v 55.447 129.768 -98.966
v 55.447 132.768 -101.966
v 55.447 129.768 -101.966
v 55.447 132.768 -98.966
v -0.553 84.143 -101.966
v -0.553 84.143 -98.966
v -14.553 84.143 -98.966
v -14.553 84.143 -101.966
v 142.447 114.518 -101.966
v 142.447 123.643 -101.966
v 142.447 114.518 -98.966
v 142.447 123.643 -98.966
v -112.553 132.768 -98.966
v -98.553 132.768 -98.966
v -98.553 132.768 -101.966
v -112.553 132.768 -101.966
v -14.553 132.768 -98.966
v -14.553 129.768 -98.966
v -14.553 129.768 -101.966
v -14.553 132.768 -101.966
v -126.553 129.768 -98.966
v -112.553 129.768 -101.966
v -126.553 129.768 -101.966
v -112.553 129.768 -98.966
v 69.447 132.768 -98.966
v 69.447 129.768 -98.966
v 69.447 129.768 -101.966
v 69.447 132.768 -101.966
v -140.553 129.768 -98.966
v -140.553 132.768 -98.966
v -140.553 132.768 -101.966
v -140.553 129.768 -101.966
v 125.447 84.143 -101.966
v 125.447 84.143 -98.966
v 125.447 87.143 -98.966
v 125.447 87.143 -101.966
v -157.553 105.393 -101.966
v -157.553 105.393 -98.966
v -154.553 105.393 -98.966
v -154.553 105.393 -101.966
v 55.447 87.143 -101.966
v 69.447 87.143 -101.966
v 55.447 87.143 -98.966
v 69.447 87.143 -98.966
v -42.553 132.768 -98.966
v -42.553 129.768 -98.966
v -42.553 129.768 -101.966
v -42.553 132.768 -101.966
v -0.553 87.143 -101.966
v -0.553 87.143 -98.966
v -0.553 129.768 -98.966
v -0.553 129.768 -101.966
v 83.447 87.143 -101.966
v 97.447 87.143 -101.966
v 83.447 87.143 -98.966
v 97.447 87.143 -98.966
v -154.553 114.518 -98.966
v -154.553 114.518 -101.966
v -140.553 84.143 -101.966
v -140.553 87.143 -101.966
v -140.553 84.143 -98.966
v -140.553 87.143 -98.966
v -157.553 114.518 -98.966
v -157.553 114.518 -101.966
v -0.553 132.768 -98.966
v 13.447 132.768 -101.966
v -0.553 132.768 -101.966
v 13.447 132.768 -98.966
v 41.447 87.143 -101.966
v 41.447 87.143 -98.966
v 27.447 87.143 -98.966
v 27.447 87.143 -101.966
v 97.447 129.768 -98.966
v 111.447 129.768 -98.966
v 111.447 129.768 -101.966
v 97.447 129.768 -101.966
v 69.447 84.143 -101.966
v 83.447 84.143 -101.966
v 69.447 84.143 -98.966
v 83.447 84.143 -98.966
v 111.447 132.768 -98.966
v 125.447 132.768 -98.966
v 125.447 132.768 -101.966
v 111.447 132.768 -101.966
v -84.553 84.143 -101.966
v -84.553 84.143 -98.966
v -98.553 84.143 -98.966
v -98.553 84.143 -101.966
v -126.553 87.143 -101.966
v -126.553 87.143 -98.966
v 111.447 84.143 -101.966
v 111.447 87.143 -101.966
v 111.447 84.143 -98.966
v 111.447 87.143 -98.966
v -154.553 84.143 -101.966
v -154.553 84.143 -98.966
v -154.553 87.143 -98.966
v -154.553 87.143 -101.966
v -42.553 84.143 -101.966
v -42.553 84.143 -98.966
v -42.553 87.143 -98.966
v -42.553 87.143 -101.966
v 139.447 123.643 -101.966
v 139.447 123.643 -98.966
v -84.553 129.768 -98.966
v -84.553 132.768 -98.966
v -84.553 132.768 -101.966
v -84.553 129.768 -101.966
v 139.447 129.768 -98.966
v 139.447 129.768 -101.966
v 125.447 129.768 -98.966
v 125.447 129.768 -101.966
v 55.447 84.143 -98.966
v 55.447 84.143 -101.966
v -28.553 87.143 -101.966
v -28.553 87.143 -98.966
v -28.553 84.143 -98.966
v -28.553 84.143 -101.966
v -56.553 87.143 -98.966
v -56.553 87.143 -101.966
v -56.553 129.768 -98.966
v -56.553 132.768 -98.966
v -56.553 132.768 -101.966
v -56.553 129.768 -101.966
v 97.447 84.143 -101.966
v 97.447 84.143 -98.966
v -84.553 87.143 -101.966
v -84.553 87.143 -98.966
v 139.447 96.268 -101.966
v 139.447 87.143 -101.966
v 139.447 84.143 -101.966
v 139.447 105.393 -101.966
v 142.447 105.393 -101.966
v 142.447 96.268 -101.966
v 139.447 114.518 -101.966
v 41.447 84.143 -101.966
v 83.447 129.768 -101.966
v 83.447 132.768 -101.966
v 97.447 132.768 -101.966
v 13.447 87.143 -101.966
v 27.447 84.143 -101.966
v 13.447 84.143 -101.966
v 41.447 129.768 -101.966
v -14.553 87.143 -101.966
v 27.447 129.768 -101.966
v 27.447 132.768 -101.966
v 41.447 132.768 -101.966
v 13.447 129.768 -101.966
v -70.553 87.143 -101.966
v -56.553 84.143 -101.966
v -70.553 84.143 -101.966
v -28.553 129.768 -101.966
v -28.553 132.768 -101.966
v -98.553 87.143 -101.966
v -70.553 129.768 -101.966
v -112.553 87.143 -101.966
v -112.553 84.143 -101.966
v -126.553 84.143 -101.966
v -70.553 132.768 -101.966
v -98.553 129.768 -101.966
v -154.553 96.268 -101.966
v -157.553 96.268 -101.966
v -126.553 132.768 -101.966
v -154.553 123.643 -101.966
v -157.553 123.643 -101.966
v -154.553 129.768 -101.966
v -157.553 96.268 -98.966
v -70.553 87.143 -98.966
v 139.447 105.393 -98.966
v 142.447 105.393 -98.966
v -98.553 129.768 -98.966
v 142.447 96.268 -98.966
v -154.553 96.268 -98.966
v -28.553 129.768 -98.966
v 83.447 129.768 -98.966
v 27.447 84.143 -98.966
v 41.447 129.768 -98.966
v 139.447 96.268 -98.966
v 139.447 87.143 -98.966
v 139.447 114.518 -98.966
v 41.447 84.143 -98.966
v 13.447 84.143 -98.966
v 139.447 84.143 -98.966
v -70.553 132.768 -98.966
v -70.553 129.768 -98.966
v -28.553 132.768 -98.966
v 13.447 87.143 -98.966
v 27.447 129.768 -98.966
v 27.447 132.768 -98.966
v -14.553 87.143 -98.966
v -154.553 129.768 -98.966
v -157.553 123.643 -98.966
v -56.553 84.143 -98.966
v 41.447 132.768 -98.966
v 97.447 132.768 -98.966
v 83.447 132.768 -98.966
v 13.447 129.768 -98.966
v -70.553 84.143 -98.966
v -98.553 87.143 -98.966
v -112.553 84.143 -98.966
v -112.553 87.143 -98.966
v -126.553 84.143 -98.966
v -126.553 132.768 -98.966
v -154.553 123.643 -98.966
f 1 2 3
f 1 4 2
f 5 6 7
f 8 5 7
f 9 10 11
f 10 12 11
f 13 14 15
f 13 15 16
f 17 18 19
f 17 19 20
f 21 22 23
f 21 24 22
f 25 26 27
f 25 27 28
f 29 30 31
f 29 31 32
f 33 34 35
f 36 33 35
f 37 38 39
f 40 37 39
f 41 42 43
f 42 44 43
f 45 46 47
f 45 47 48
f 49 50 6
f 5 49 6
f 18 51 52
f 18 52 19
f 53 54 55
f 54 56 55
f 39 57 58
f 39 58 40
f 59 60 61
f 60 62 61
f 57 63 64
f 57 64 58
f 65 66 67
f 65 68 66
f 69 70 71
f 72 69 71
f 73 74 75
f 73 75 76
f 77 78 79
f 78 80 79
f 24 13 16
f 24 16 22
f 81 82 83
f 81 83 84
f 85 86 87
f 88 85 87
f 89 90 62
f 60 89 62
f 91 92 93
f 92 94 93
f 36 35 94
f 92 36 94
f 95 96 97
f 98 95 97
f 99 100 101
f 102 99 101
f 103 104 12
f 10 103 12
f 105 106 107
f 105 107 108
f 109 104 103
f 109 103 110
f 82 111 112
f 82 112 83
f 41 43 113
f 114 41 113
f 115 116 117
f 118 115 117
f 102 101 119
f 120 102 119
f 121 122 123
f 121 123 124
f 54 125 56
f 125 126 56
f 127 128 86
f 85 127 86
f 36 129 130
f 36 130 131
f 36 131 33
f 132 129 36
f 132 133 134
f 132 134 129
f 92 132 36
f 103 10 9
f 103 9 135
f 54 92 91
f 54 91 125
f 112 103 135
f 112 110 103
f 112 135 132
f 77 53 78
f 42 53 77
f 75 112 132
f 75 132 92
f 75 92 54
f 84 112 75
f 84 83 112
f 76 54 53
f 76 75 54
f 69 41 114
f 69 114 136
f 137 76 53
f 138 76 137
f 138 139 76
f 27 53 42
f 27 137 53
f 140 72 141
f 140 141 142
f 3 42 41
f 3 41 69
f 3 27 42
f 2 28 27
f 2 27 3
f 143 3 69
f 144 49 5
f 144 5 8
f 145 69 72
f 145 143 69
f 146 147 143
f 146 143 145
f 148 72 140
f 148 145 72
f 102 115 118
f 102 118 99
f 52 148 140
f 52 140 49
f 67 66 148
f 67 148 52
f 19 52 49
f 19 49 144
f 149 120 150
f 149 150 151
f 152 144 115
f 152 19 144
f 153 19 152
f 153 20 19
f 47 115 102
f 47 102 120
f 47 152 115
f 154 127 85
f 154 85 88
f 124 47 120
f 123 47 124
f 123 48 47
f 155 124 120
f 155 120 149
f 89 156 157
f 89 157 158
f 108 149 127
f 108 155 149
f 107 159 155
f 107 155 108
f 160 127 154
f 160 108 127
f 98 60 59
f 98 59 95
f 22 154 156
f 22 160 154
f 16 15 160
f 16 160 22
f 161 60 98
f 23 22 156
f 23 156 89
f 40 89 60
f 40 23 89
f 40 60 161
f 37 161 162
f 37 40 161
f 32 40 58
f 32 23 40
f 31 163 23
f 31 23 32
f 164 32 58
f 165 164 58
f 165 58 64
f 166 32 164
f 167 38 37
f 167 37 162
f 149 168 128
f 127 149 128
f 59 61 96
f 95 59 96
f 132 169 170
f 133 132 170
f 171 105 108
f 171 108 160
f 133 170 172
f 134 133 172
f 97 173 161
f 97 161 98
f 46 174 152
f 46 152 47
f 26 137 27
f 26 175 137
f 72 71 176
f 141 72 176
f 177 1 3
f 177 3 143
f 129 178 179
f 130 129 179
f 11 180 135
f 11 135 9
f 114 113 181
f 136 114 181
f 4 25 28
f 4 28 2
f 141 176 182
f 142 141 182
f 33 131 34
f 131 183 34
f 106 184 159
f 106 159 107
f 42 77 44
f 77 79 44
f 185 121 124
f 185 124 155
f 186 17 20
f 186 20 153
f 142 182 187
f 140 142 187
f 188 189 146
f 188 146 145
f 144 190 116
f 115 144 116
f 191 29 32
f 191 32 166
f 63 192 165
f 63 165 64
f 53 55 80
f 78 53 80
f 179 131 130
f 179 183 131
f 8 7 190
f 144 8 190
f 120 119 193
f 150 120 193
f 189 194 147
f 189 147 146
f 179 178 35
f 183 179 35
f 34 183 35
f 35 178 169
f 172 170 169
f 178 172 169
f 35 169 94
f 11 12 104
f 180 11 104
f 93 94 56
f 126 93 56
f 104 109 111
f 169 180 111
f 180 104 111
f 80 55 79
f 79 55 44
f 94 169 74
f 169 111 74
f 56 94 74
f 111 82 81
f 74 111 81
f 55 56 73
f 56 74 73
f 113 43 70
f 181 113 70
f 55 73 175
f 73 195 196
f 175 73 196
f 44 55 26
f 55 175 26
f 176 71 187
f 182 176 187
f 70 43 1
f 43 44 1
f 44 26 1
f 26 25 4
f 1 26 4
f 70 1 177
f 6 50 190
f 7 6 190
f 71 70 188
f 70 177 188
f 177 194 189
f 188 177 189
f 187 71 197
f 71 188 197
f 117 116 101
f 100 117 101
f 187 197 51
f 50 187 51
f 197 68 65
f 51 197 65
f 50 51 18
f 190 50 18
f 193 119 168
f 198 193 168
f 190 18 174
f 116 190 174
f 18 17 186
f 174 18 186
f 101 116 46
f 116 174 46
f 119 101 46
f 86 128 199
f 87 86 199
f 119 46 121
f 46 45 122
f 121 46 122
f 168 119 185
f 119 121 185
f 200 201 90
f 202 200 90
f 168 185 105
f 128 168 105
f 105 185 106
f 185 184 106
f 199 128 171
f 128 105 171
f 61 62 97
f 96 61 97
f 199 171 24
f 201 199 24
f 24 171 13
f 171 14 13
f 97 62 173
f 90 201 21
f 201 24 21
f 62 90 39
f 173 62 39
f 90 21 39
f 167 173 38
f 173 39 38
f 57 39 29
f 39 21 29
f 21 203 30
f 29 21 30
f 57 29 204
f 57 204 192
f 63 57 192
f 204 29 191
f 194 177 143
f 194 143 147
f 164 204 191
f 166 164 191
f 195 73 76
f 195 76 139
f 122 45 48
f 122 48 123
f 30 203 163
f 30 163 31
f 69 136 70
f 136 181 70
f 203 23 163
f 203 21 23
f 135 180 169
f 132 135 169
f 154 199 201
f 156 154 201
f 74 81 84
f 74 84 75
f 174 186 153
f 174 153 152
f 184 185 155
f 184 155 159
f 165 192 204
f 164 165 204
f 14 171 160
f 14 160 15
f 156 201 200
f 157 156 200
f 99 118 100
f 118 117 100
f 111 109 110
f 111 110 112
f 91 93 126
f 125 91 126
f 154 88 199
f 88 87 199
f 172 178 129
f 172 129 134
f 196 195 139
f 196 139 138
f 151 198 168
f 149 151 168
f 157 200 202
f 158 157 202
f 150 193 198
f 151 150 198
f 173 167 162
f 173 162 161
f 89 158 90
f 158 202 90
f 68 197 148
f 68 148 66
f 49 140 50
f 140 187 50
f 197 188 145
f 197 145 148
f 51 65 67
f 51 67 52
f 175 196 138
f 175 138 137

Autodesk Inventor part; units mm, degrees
ref_plane "YZ Plane" through (0, 0, 0) normal (1, 0, 0) x (0, 1, 0)
ref_plane "XZ Plane" through (0, 0, 0) normal (0, 1, 0) x (-1, 0, 0)
ref_plane "XY Plane" through (0, 0, 0) normal (0, 0, 1) x (1, 0, 0)
ref_plane "Work Plane1" through (139.4467, 111.518, -98.9659) normal (0, 0, -1) x (-1, 0, 0)
sketch "Sketch1" plane through (139.4467, 111.518, -98.9659) normal (0, 0, -1) x (-1, 0, 0)
  line L0 (0, -27.375) -> (14, -27.375)
  line L1 (14, -27.375) -> (14, -24.375)
  line L2 (14, -24.375) -> (28, -24.375)
  line L3 (28, -24.375) -> (28, -27.375)
  line L4 (56, -24.375) -> (56, -27.375)
  line L5 (42, -24.375) -> (56, -24.375)
  line L6 (42, -27.375) -> (42, -24.375)
  line L7 (28, -27.375) -> (42, -27.375)
  line L8 (84, -24.375) -> (84, -27.375)
  line L9 (70, -24.375) -> (84, -24.375)
  line L10 (70, -27.375) -> (70, -24.375)
  line L11 (56, -27.375) -> (70, -27.375)
  line L12 (112, -24.375) -> (112, -27.375)
  line L13 (98, -24.375) -> (112, -24.375)
  line L14 (98, -27.375) -> (98, -24.375)
  line L15 (84, -27.375) -> (98, -27.375)
  line L16 (140, -24.375) -> (140, -27.375)
  line L17 (126, -24.375) -> (140, -24.375)
  line L18 (126, -27.375) -> (126, -24.375)
  line L19 (112, -27.375) -> (126, -27.375)
  line L20 (168, -24.375) -> (168, -27.375)
  line L21 (154, -24.375) -> (168, -24.375)
  line L22 (154, -27.375) -> (154, -24.375)
  line L23 (140, -27.375) -> (154, -27.375)
  line L24 (196, -24.375) -> (196, -27.375)
  line L25 (182, -24.375) -> (196, -24.375)
  line L26 (182, -27.375) -> (182, -24.375)
  line L27 (168, -27.375) -> (182, -27.375)
  line L28 (224, -24.375) -> (224, -27.375)
  line L29 (210, -24.375) -> (224, -24.375)
  line L30 (210, -27.375) -> (210, -24.375)
  line L31 (196, -27.375) -> (210, -27.375)
  line L32 (252, -24.375) -> (252, -27.375)
  line L33 (238, -24.375) -> (252, -24.375)
  line L34 (238, -27.375) -> (238, -24.375)
  line L35 (224, -27.375) -> (238, -27.375)
  line L36 (280, -24.375) -> (280, -27.375)
  line L37 (266, -24.375) -> (280, -24.375)
  line L38 (266, -27.375) -> (266, -24.375)
  line L39 (252, -27.375) -> (266, -27.375)
  line L40 (280, -27.375) -> (294, -27.375)
  line L41 (0, 18.25) -> (14, 18.25)
  line L42 (14, 18.25) -> (14, 21.25)
  line L43 (14, 21.25) -> (28, 21.25)
  line L44 (28, 21.25) -> (28, 18.25)
  line L45 (56, 21.25) -> (56, 18.25)
  line L46 (42, 21.25) -> (56, 21.25)
  line L47 (42, 18.25) -> (42, 21.25)
  line L48 (28, 18.25) -> (42, 18.25)
  line L49 (84, 21.25) -> (84, 18.25)
  line L50 (70, 21.25) -> (84, 21.25)
  line L51 (70, 18.25) -> (70, 21.25)
  line L52 (56, 18.25) -> (70, 18.25)
  line L53 (112, 21.25) -> (112, 18.25)
  line L54 (98, 21.25) -> (112, 21.25)
  line L55 (98, 18.25) -> (98, 21.25)
  line L56 (84, 18.25) -> (98, 18.25)
  line L57 (140, 21.25) -> (140, 18.25)
  line L58 (126, 21.25) -> (140, 21.25)
  line L59 (126, 18.25) -> (126, 21.25)
  line L60 (112, 18.25) -> (126, 18.25)
  line L61 (168, 21.25) -> (168, 18.25)
  line L62 (154, 21.25) -> (168, 21.25)
  line L63 (154, 18.25) -> (154, 21.25)
  line L64 (140, 18.25) -> (154, 18.25)
  line L65 (196, 21.25) -> (196, 18.25)
  line L66 (182, 21.25) -> (196, 21.25)
  line L67 (182, 18.25) -> (182, 21.25)
  line L68 (168, 18.25) -> (182, 18.25)
  line L69 (224, 21.25) -> (224, 18.25)
  line L70 (210, 21.25) -> (224, 21.25)
  line L71 (210, 18.25) -> (210, 21.25)
  line L72 (196, 18.25) -> (210, 18.25)
  line L73 (252, 21.25) -> (252, 18.25)
  line L74 (238, 21.25) -> (252, 21.25)
  line L75 (238, 18.25) -> (238, 21.25)
  line L76 (224, 18.25) -> (238, 18.25)
  line L77 (280, 21.25) -> (280, 18.25)
  line L78 (266, 21.25) -> (280, 21.25)
  line L79 (266, 18.25) -> (266, 21.25)
  line L80 (252, 18.25) -> (266, 18.25)
  line L81 (280, 18.25) -> (294, 18.25)
  line L82 (297, 12.125) -> (297, 3)
  line L83 (297, 3) -> (294, 3)
  line L84 (294, 3) -> (294, -6.125)
  line L85 (297, -6.125) -> (294, -6.125)
  line L86 (297, -6.125) -> (297, -15.25)
  line L87 (297, -15.25) -> (294, -15.25)
  line L88 (294, -15.25) -> (294, -24.375)
  line L89 (297, 12.125) -> (294, 12.125)
  line L90 (0, -15.25) -> (0, -24.375)
  line L91 (0, -15.25) -> (-3, -15.25)
  line L92 (-3, -6.125) -> (-3, -15.25)
  line L93 (0, -6.125) -> (-3, -6.125)
  line L94 (0, 3) -> (0, -6.125)
  line L95 (0, 3) -> (-3, 3)
  line L96 (-3, 12.125) -> (-3, 3)
  line L97 (0, 12.125) -> (-3, 12.125)
  line L98 (0, -27.375) -> (0, -24.375)
  line L99 (0, 12.125) -> (0, 18.25)
  line L100 (294, -27.375) -> (294, -24.375)
  line L101 (294, 12.125) -> (294, 18.25)
  line L102 (294, 21.25) -> (-3, 21.25)
  point P0 (139.4467, -111.518)
  point P1 (28, -27.375)
  point P2 (56, -27.375)
  point P3 (168, -27.375)
  point P4 (224, -27.375)
  point P5 (252, 18.25)
  point P6 (224, 18.25)
  point P7 (196, 18.25)
  point P8 (168, 18.25)
  point P9 (140, 18.25)
  point P10 (112, 18.25)
  point P11 (84, 18.25)
  point P12 (56, 18.25)
  point P13 (28, 18.25)
  dimension "d0" = 3
  dimension "d1" = 14
  dimension "d4" = 28
  dimension "d13" = 3
  dimension "d14" = 14
  dimension "d15" = 28
extrude "Extrusion1" add sketch "Sketch1" along normal blind 3 contours L98 L90 L91 L92 L93 L94 L95 L96 L97 L99 L41 L42 L43 L44 L48 L47 L46 L45 L52 L51 L50 L49 L56 L55 L54 L53 L60 L59 L58 L57 L64 L63 L62 L61 L68 L67 L66 L65 L72 L71 L70 L69 L76 L75 L74 L73 L80 L79 L78 L77 L81 L101 L89 L82 L83 L84 L85 L86 L87 L88 L100 L40 L36 L37 L38 L39 L32 L33 L34 L35 L28 L29 L30 L31 L24 L25 L26 L27 L20 L21 L22 L23 L16 L17 L18 L19 L12 L13 L14 L15 L8 L9 L10 L11 L4 L5 L6 L7 L3 L2 L1 L0
properties part number "BackWall"
